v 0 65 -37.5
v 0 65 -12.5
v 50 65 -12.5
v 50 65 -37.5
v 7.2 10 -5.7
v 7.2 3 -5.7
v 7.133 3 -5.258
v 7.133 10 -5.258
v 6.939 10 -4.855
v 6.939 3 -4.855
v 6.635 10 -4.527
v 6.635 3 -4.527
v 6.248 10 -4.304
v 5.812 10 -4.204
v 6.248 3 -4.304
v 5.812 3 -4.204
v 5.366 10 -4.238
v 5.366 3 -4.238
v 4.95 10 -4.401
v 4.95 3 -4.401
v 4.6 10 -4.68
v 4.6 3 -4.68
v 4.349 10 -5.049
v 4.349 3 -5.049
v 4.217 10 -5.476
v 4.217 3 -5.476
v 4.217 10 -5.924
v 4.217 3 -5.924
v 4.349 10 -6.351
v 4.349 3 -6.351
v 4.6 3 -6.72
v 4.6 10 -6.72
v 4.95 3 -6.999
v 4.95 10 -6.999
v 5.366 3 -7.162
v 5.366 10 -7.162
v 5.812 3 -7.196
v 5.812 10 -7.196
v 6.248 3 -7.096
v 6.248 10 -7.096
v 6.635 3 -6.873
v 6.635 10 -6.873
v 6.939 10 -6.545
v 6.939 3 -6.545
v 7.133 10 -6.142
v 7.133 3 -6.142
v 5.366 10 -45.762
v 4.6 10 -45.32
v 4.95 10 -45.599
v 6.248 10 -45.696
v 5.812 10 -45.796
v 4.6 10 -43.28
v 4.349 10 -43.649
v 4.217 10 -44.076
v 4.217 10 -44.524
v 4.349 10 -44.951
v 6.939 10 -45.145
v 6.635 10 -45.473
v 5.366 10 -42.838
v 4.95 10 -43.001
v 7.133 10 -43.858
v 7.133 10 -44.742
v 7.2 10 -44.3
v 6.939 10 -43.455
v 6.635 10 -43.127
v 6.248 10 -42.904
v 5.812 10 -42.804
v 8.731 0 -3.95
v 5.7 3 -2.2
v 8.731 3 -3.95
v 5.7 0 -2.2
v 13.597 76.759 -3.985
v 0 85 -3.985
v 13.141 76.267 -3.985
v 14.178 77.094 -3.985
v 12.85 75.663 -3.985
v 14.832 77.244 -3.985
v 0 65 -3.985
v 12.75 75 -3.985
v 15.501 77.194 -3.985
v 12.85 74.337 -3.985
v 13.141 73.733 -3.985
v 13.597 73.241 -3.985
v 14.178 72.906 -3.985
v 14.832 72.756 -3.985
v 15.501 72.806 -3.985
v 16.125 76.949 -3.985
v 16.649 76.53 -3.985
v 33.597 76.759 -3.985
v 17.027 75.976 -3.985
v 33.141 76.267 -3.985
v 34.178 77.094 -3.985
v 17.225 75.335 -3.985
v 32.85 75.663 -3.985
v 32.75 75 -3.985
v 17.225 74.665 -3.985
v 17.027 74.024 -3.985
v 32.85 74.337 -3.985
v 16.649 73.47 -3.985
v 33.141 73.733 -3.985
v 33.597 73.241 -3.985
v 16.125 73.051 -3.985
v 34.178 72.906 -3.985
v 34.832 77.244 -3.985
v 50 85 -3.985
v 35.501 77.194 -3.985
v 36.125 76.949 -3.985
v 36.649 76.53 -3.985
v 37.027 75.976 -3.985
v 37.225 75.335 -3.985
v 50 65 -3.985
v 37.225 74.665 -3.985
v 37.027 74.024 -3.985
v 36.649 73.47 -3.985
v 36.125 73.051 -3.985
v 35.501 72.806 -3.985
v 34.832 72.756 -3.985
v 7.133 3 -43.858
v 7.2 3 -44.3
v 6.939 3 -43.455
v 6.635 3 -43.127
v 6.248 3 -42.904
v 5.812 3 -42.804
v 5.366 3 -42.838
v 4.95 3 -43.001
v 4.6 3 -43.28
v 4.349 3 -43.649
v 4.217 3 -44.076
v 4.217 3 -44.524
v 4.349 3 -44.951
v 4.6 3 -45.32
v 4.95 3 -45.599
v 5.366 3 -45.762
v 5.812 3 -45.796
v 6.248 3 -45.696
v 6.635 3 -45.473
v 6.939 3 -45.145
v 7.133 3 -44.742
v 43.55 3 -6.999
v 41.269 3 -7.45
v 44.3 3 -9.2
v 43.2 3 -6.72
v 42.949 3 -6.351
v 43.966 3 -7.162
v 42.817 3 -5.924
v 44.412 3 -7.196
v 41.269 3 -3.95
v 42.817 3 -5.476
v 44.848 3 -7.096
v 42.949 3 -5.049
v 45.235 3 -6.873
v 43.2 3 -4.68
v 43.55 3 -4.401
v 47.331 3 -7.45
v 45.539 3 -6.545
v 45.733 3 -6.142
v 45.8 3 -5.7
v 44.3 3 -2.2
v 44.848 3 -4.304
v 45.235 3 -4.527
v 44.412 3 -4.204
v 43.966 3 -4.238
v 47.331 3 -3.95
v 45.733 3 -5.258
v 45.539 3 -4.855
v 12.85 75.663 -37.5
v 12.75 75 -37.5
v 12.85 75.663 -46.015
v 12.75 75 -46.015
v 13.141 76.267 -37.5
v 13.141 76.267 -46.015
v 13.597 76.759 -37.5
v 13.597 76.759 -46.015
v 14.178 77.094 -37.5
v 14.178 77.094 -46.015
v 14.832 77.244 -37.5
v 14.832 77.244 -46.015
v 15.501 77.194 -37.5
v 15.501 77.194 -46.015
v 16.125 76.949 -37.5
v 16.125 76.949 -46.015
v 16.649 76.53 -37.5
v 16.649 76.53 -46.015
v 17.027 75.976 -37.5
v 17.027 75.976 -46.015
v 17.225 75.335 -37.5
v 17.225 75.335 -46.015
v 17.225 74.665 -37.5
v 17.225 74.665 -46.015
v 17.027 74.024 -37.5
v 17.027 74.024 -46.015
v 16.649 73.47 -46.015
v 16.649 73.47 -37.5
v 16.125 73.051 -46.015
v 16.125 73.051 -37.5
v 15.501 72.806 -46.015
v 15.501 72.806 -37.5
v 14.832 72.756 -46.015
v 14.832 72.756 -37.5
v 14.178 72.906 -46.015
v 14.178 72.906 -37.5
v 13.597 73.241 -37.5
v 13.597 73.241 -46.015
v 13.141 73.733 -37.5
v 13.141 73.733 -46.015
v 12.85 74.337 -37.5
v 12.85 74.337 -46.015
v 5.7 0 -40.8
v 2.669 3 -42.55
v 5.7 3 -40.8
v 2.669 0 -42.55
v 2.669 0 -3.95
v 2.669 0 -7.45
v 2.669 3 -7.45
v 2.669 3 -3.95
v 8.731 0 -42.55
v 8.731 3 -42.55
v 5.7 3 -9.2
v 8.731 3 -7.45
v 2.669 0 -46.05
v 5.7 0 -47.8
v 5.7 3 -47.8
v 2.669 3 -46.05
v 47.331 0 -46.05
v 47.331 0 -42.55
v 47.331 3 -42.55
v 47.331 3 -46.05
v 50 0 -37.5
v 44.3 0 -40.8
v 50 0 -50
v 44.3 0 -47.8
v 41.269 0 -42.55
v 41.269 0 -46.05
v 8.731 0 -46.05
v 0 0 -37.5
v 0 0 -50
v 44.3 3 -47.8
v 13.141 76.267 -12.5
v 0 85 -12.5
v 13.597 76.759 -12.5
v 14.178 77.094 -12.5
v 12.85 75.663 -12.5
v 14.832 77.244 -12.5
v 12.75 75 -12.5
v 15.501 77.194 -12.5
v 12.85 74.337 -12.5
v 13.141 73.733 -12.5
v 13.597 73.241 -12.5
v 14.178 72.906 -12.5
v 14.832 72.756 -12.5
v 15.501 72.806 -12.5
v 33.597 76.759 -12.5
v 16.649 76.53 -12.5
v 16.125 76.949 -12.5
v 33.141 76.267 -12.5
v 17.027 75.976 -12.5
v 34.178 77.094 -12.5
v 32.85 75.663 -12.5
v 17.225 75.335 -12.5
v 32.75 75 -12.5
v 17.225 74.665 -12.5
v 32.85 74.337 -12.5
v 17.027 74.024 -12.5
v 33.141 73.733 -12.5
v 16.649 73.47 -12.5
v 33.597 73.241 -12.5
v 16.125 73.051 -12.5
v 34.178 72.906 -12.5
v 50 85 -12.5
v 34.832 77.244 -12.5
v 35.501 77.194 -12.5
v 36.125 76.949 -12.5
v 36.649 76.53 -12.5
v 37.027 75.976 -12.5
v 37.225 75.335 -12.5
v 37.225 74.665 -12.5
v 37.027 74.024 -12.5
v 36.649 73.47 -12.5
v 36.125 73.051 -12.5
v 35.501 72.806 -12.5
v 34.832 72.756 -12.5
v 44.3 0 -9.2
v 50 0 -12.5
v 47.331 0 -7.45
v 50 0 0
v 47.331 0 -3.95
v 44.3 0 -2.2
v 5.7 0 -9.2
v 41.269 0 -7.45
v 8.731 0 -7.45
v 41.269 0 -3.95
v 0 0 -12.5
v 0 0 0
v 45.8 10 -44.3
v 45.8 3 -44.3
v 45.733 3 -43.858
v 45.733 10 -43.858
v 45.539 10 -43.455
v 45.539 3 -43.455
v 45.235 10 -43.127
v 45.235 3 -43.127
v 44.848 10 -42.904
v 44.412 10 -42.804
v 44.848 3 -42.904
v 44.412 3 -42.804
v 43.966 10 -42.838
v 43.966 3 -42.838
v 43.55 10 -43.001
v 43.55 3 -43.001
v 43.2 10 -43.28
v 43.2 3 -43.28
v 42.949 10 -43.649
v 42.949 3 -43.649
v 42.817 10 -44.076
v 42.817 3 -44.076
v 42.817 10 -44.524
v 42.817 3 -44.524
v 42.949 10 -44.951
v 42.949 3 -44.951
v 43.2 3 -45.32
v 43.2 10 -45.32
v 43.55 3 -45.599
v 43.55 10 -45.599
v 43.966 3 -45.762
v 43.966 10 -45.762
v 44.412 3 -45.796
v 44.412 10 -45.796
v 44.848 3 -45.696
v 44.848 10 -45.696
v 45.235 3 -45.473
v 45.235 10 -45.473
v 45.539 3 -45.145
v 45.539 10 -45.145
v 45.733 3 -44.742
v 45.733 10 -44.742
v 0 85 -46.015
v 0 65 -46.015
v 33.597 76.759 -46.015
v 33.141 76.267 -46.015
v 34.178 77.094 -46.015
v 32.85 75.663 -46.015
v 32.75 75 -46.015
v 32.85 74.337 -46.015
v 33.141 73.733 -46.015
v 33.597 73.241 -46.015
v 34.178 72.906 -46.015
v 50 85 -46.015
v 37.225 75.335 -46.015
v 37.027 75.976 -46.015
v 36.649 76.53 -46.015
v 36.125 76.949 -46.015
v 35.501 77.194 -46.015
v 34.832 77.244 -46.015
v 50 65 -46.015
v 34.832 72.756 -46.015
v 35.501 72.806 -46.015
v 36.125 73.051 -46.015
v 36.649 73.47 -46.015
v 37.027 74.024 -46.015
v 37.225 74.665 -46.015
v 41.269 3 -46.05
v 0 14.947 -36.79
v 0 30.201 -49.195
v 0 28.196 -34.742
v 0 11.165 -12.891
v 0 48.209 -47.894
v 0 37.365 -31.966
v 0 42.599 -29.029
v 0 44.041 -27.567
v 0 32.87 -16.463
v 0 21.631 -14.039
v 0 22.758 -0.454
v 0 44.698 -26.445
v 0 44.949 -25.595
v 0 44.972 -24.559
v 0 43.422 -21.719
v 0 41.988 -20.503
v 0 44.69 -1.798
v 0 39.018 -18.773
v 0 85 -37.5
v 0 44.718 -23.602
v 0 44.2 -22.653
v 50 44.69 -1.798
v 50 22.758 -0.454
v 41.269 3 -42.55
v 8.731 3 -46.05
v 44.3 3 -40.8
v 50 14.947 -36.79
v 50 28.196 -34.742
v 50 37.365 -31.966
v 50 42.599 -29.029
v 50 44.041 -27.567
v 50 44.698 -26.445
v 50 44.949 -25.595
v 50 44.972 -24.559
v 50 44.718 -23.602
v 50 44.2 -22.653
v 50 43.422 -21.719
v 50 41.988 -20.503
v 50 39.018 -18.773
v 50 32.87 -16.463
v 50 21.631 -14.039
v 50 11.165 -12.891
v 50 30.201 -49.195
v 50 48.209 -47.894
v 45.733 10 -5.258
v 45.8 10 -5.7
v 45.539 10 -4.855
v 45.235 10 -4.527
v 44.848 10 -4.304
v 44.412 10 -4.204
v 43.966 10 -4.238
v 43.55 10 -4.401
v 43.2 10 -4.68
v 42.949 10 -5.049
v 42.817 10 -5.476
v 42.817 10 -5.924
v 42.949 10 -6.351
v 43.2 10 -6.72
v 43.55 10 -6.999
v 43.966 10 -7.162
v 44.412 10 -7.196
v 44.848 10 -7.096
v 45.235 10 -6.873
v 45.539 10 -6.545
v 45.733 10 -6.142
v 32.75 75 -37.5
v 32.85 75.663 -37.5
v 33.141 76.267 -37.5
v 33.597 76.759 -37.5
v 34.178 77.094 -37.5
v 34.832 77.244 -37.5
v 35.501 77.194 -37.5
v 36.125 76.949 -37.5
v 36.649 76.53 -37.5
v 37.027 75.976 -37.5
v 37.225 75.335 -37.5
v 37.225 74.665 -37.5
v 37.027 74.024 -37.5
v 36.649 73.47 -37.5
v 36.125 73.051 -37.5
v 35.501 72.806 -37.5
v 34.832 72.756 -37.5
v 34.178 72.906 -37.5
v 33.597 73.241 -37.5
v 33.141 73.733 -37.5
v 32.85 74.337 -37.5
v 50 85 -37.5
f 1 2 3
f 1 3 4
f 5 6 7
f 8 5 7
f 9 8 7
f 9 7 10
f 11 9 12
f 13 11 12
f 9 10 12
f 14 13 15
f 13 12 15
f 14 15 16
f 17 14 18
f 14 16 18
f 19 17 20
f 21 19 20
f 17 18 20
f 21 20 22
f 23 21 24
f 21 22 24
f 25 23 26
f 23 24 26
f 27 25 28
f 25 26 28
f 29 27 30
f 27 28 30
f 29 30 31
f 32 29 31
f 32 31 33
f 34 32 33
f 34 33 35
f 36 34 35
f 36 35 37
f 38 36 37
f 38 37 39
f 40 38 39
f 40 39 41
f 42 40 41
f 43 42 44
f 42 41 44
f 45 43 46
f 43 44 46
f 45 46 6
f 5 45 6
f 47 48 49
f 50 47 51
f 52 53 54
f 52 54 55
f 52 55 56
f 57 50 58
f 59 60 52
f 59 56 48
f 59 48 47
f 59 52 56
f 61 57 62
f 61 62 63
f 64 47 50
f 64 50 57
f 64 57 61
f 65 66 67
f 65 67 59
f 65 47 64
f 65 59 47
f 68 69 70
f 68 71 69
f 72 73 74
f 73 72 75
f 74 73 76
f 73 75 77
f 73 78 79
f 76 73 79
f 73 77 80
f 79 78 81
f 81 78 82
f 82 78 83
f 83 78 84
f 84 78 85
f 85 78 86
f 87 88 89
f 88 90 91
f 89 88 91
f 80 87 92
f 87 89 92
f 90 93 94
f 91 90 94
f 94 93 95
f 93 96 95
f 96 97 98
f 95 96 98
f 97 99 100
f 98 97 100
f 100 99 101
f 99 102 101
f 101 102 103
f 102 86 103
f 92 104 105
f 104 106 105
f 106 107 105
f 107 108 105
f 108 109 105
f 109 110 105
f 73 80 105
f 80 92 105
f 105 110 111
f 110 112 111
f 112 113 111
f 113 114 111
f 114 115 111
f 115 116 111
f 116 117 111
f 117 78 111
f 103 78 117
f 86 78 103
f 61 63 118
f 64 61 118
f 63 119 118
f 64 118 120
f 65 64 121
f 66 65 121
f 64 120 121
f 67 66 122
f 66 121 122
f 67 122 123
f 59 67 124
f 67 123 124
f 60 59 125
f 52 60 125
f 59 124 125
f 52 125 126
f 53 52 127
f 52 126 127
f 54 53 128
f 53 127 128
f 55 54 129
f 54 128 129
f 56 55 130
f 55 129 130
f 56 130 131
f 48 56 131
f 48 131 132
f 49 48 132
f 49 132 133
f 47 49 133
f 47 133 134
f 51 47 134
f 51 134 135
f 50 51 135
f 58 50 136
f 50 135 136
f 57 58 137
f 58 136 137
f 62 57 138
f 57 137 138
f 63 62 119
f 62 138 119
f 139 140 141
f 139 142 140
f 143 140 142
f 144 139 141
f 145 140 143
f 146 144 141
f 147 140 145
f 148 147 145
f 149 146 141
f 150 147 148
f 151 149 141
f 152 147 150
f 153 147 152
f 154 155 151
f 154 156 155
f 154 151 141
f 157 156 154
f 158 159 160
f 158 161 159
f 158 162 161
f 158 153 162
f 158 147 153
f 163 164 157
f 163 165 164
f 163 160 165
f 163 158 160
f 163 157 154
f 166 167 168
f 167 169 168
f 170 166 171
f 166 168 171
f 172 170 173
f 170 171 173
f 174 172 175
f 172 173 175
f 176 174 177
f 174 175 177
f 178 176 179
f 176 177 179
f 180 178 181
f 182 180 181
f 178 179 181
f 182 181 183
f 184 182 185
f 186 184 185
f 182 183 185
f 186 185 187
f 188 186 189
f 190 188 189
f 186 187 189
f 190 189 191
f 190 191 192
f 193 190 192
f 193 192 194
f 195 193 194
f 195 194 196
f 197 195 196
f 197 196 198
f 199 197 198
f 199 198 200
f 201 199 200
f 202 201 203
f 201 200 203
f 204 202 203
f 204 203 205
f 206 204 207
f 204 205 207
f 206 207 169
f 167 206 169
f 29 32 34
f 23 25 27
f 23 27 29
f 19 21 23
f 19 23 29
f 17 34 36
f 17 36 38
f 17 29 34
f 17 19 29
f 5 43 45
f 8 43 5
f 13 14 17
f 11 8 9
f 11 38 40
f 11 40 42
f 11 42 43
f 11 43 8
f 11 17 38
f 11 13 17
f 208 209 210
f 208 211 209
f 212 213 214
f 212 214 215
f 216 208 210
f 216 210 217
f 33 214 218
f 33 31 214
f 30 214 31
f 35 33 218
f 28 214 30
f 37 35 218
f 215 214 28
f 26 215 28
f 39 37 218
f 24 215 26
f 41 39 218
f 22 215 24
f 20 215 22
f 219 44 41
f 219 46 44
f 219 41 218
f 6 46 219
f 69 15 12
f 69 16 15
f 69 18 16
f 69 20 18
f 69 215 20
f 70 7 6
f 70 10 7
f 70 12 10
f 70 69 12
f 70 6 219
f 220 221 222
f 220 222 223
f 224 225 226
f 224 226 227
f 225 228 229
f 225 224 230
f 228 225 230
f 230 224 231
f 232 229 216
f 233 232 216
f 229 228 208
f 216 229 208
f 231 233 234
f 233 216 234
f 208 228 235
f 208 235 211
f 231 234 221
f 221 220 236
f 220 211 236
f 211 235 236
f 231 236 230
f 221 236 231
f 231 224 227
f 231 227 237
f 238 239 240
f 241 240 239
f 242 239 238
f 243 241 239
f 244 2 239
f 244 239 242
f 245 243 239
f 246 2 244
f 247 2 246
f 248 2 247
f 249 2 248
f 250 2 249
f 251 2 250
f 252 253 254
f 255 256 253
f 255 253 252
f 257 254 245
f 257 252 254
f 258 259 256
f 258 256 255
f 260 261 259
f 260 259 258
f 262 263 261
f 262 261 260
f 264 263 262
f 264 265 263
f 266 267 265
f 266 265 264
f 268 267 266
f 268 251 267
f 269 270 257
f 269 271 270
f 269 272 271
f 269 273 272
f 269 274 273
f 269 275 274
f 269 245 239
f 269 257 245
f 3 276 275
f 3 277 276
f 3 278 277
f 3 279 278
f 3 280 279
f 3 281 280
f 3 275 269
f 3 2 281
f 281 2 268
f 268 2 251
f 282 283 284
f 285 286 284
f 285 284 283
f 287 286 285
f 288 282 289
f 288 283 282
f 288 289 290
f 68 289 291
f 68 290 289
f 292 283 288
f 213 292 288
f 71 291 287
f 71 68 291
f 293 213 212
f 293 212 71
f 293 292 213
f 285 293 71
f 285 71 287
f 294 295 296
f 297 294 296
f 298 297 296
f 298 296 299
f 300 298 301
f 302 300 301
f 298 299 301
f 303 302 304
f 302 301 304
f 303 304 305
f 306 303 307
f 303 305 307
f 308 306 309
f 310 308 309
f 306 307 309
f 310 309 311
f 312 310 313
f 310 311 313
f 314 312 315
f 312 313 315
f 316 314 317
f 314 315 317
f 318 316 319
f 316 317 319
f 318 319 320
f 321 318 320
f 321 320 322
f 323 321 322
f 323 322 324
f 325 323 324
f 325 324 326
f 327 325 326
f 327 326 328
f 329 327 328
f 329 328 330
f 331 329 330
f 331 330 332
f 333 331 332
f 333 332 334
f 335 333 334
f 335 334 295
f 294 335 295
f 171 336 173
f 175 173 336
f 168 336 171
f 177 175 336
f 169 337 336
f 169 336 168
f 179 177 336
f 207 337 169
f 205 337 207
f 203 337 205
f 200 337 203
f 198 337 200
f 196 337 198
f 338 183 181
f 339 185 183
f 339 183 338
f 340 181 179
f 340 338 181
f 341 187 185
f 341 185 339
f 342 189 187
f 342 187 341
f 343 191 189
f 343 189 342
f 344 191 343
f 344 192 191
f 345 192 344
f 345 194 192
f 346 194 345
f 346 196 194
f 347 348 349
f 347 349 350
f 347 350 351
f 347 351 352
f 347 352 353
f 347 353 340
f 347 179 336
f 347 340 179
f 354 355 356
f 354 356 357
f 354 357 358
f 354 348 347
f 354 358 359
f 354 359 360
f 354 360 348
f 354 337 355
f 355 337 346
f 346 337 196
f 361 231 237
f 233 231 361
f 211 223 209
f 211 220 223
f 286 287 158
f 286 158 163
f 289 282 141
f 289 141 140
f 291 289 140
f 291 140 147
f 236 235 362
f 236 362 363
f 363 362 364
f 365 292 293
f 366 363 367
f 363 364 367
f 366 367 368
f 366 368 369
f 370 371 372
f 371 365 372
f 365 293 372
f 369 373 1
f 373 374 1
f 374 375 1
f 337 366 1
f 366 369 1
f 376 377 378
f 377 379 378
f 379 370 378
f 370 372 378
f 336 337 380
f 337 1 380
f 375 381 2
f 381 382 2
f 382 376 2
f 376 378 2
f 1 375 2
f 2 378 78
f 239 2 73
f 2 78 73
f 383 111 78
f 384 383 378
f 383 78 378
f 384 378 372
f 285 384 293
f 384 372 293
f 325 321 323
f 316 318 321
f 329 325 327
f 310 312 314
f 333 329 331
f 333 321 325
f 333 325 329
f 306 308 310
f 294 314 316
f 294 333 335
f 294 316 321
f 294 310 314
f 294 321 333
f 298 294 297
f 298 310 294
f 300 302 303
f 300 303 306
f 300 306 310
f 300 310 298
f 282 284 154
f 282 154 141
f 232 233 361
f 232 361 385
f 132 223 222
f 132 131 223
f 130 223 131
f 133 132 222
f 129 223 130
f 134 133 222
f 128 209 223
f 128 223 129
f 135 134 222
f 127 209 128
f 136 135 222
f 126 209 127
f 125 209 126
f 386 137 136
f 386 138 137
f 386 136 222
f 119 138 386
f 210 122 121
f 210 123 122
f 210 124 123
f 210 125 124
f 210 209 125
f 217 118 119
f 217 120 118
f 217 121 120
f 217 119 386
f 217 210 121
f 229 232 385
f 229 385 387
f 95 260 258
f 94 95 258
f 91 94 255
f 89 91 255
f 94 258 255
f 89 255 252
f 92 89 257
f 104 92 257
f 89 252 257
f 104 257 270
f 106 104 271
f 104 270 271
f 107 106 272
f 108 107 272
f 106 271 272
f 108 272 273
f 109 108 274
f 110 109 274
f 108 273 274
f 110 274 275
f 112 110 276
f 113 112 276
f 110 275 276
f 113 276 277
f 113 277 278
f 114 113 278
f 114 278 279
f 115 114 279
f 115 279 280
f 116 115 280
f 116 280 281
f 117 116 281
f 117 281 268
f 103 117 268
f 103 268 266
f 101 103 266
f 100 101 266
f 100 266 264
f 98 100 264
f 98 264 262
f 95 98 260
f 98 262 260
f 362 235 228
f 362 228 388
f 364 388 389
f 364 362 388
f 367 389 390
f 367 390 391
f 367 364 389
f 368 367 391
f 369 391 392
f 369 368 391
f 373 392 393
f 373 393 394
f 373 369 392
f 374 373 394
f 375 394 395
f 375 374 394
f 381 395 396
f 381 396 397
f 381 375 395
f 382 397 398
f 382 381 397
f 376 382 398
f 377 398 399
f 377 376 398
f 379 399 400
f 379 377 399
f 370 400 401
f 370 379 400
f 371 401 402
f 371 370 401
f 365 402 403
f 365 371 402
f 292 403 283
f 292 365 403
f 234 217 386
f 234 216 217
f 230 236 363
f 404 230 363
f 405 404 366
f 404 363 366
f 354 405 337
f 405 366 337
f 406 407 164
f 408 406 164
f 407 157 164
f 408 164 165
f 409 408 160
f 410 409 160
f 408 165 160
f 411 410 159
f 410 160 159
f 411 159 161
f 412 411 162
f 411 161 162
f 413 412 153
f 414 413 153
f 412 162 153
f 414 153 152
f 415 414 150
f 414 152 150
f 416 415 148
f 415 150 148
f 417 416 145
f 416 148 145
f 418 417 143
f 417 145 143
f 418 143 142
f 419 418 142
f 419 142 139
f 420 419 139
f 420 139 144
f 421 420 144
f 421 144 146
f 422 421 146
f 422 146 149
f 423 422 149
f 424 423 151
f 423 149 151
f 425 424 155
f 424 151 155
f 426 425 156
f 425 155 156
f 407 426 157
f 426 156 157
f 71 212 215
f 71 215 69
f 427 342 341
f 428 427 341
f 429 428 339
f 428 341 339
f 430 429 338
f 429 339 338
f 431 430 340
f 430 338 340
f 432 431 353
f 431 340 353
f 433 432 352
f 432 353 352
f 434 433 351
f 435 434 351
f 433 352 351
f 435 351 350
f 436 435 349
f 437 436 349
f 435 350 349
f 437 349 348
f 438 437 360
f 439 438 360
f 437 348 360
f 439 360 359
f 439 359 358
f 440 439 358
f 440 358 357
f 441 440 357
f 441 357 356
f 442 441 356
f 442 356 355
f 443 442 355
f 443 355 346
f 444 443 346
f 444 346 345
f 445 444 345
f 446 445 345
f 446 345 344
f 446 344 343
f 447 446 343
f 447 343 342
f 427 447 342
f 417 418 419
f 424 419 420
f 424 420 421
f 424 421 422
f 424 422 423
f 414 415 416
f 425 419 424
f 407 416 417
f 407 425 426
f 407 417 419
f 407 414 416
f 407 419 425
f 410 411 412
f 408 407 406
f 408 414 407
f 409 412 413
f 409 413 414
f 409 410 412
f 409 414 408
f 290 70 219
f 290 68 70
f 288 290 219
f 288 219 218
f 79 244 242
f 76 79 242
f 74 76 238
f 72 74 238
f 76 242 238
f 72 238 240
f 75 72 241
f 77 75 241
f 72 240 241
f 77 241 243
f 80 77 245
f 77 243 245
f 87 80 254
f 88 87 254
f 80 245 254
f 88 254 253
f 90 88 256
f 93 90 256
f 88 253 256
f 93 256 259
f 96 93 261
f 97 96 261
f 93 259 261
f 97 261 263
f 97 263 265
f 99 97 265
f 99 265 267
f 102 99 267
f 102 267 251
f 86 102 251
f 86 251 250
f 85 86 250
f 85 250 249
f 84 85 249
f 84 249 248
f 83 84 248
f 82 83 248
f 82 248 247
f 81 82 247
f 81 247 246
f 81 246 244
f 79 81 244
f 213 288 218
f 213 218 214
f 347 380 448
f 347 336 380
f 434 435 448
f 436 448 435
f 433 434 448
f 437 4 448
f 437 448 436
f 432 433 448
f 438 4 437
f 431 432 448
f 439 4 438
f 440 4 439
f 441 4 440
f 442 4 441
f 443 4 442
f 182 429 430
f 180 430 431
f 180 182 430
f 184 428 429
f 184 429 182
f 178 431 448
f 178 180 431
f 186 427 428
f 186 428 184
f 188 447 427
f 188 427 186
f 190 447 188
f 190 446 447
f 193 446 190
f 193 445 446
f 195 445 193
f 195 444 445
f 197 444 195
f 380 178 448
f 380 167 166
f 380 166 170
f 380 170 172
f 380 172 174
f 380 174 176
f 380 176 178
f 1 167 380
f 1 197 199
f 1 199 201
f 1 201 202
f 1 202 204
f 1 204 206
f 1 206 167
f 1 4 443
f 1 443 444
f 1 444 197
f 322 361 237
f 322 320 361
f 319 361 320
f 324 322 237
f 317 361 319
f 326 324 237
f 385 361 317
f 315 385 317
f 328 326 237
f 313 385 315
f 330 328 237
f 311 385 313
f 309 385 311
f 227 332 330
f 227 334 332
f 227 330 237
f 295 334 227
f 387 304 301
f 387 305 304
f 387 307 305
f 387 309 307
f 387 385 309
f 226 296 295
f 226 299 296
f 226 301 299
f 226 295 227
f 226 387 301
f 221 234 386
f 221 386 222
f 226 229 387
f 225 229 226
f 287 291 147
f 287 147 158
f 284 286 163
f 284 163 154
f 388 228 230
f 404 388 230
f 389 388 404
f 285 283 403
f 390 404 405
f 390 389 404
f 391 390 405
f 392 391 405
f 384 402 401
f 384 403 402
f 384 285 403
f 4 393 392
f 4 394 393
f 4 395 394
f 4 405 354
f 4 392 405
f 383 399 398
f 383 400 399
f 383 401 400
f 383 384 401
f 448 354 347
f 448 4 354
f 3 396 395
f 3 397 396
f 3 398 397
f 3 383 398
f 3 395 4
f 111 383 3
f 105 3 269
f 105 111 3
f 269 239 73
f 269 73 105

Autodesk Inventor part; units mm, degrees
ref_plane "YZ Plane" through (0, 0, 0) normal (1, 0, 0) x (0, 1, 0)
ref_plane "XZ Plane" through (0, 0, 0) normal (0, 1, 0) x (-1, 0, 0)
ref_plane "XY Plane" through (0, 0, 0) normal (0, 0, 1) x (1, 0, 0)
sketch "Sketch1" plane through (0, 0, 0) normal (1, 0, 0) x (0, 1, 0)
  ellipse E0 centre (0, -25) end of major axis (45, -25) minor radius 12.5 (0, -37.5) -> (0, -12.5) ccw
  ellipse E1 centre (0, -25) end of major axis (120, -25) minor radius 25 (0, -50) -> (0, 0) ccw
  line L0 (65, -3.9852) -> (65, -46.0148)
  line L1 (0, -37.5) -> (0, -50)
  line L2 (0, -12.5) -> (0, 0)
  point P0 (0, -43.75)
  point P1 (0, -6.25)
  dimension "d23" = 45
  dimension "d25" = 120
  dimension "d18" = 50
  dimension "d22" = 25
  dimension "d24" = 65
extrude "Extrusion1" add sketch "Sketch1" along normal blind 50 contours E0 L2 E1 L0 L1
sketch "Sketch3" plane through (0, 65, -3.9852) normal (0, 1, 0) x (1, 0, 0)
  line L0 (0, 42.0297) -> (0, 0) projected
  line L1 (0, 0) -> (50, 0) projected
  line L2 (50, 42.0297) -> (50, 0) projected
  line L3 (0, 42.0297) -> (50, 42.0297) projected
  line L4 (0, 33.5148) -> (0, 8.5148) projected
  line L5 (50, 0) -> (0, 0)
  line L6 (0, 0) -> (0, 8.5148)
  line L7 (0, 8.5148) -> (50, 8.5148)
  line L8 (50, 8.5148) -> (50, 0)
  line L9 (0, 42.0297) -> (50, 42.0297)
  line L10 (50, 42.0297) -> (50, 33.5148)
  line L11 (50, 33.5148) -> (0, 33.5148)
  line L12 (0, 33.5148) -> (0, 42.0297)
  point P0 (0, -3.9852)
  point P1 (0, 33.5148)
  dimension "d26" = 25
  dimension "d27" = 8.5148
  dimension "d28" = 8.5148
extrude "Extrusion3" add sketch "Sketch3" along normal blind 20 contours L3 L2 L11 L0 | L7 L2 L1 L0
sketch "Sketch4" plane through (50, 65, -46.0148) normal (0, 0, -1) x (-1, 0, 0)
  line L0 (50, 0) -> (0, 0) projected
  line L1 (50, 0) -> (50, 20) projected
  line L2 (0, 20) -> (50, 20) projected
  line L3 (0, 0) -> (0, 20) projected
  line L4 (0, 0) -> (0, 20) projected
  line L5 (0, 10) -> (50, 10)
  circle A0 centre (15, 10) radius 2.25
  circle A1 centre (35, 10) radius 2.25
  point P0 (50, -65)
  dimension "d31" = 4.5
  dimension "d32" = 4.5
  dimension "d33" = 20
  dimension "d34" = 15
  dimension "d35" = 15
extrude "Extrusion4" cut sketch "Sketch4" against normal through all contours A1 L5 | L5 A1 | A0 L5 | L5 A0
sketch "Sketch5" plane through (0, 0, -12.5) normal (0, -1, 0) x (1, 0, 0)
  line L0 (0, 12.5) -> (0, 0) projected
  line L1 (0, 0) -> (50, 0) projected
  line L2 (50, 12.5) -> (50, 0) projected
  line L3 (0, 12.5) -> (50, 12.5) projected
  line L4 (0, -25) -> (0, -37.5) projected
  line L5 (0, -37.5) -> (50, -37.5) projected
  line L6 (50, -25) -> (50, -37.5) projected
  line L7 (0, -25) -> (50, -25) projected
  line L8 (50, 8.5148) -> (50, 12.5) projected
  line L9 (0, -25) -> (0, -37.5) projected
  line L10 (50, 12.5) -> (0, -37.5)
  line L11 (5.7, 6.8) -> (44.3, 6.8)
  line L12 (44.3, 6.8) -> (44.3, -31.8)
  line L13 (44.3, -31.8) -> (5.7, -31.8)
  line L14 (5.7, -31.8) -> (5.7, 6.8)
  line L15 (5.7, 6.8) -> (44.3, -31.8) construction
  line L16 (44.3, 6.8) -> (5.7, -31.8) construction
  line L17 (44.3, 3.3) -> (41.2689, 5.05)
  line L18 (41.2689, 5.05) -> (41.2689, 8.55)
  line L19 (41.2689, 8.55) -> (44.3, 10.3)
  line L20 (44.3, 10.3) -> (47.3311, 8.55)
  line L21 (47.3311, 8.55) -> (47.3311, 5.05)
  line L22 (47.3311, 5.05) -> (44.3, 3.3)
  line L23 (41.2689, -33.55) -> (41.2689, -30.05)
  line L24 (41.2689, -30.05) -> (44.3, -28.3)
  line L25 (44.3, -28.3) -> (47.3311, -30.05)
  line L26 (47.3311, -30.05) -> (47.3311, -33.55)
  line L27 (47.3311, -33.55) -> (44.3, -35.3)
  line L28 (44.3, -35.3) -> (41.2689, -33.55)
  line L29 (8.7311, -30.05) -> (8.7311, -33.55)
  line L30 (8.7311, -33.55) -> (5.7, -35.3)
  line L31 (5.7, -35.3) -> (2.6689, -33.55)
  line L32 (2.6689, -33.55) -> (2.6689, -30.05)
  line L33 (2.6689, -30.05) -> (5.7, -28.3)
  line L34 (5.7, -28.3) -> (8.7311, -30.05)
  line L35 (8.7311, 8.55) -> (8.7311, 5.05)
  line L36 (8.7311, 5.05) -> (5.7, 3.3)
  line L37 (5.7, 3.3) -> (2.6689, 5.05)
  line L38 (2.6689, 5.05) -> (2.6689, 8.55)
  line L39 (2.6689, 8.55) -> (5.7, 10.3)
  line L40 (5.7, 10.3) -> (8.7311, 8.55)
  point P0 (25, -12.5)
  dimension "d38" = 38.6
  dimension "d39" = 38.6
  dimension "d40" = 7
  dimension "d41" = 7
  dimension "d42" = 7
  dimension "d43" = 7
extrude "Extrusion5" cut sketch "Sketch5" against normal blind 3 contours L20 L21 L22 L12 L10 | L10 L11 L18 L19 L20 | L37 L38 L39 L40 L35 L11 L14 | L14 L11 L35 L36 | L12 L17 L10 | L10 L17 L18 L11 | L34 L10 L14 | L14 L10 L31 L32 L33 | L34 L29 L13 L10 | L13 L29 L30 L31 L10 | L25 L26 L27 L28 L23 L13 L12 | L12 L13 L23 L24
sketch "Sketch6" plane through (0, 0, -12.5) normal (0, -1, 0) x (1, 0, 0)
  line L0 (44.3, 10.3) -> (47.3311, 8.55) projected
  line L1 (41.2689, 8.55) -> (44.3, 10.3) projected
  line L2 (41.2689, 5.05) -> (41.2689, 8.55) projected
  line L3 (44.3, 3.3) -> (41.2689, 5.05) projected
  line L4 (47.3311, 5.05) -> (44.3, 3.3) projected
  line L5 (47.3311, 8.55) -> (47.3311, 5.05) projected
  line L6 (47.3311, -33.55) -> (44.3, -35.3) projected
  line L7 (47.3311, -30.05) -> (47.3311, -33.55) projected
  line L8 (44.3, -28.3) -> (47.3311, -30.05) projected
  line L9 (41.2689, -30.05) -> (44.3, -28.3) projected
  line L10 (41.2689, -33.55) -> (41.2689, -30.05) projected
  line L11 (44.3, -35.3) -> (41.2689, -33.55) projected
  line L12 (5.7, -35.3) -> (2.6689, -33.55) projected
  line L13 (8.7311, -33.55) -> (5.7, -35.3) projected
  line L14 (8.7311, -30.05) -> (8.7311, -33.55) projected
  line L15 (5.7, -28.3) -> (8.7311, -30.05) projected
  line L16 (2.6689, -30.05) -> (5.7, -28.3) projected
  line L17 (2.6689, -33.55) -> (2.6689, -30.05) projected
  line L18 (2.6689, 8.55) -> (5.7, 10.3) projected
  line L19 (2.6689, 5.05) -> (2.6689, 8.55) projected
  line L20 (5.7, 3.3) -> (2.6689, 5.05) projected
  line L21 (8.7311, 5.05) -> (5.7, 3.3) projected
  line L22 (8.7311, 8.55) -> (8.7311, 5.05) projected
  line L23 (5.7, 10.3) -> (8.7311, 8.55) projected
  line L24 (8.7311, 8.55) -> (2.6689, 5.05)
  circle A0 centre (5.7, 6.8) radius 1.5
  line L25 (2.6689, -30.05) -> (8.7311, -33.55)
  line L26 (47.3311, -33.55) -> (44.3, -35.3) projected
  line L27 (41.2689, -30.05) -> (47.3311, -33.55)
  line L28 (41.2689, 5.05) -> (41.2689, 8.55) projected
  line L29 (47.3311, 5.05) -> (44.3, 3.3) projected
  line L30 (41.2689, 8.55) -> (47.3311, 5.05)
  circle A1 centre (44.3, 6.8) radius 1.5
  circle A2 centre (44.3, -31.8) radius 1.5
  circle A3 centre (5.7, -31.8) radius 1.5
  point P0 (0, 12.5)
  dimension "d46" = 3
  dimension "d47" = 3
  dimension "d48" = 3
  dimension "d49" = 3
extrude "Extrusion6" cut sketch "Sketch6" against normal blind 10 contours A1 L30 | L30 A1 | A2 L27 | L27 A2 | A3 L25 | L25 A3 | A0 L24 | L24 A0
equation "\"d27\" = d28"
properties part number "Arch" material "ABS Plastic"
